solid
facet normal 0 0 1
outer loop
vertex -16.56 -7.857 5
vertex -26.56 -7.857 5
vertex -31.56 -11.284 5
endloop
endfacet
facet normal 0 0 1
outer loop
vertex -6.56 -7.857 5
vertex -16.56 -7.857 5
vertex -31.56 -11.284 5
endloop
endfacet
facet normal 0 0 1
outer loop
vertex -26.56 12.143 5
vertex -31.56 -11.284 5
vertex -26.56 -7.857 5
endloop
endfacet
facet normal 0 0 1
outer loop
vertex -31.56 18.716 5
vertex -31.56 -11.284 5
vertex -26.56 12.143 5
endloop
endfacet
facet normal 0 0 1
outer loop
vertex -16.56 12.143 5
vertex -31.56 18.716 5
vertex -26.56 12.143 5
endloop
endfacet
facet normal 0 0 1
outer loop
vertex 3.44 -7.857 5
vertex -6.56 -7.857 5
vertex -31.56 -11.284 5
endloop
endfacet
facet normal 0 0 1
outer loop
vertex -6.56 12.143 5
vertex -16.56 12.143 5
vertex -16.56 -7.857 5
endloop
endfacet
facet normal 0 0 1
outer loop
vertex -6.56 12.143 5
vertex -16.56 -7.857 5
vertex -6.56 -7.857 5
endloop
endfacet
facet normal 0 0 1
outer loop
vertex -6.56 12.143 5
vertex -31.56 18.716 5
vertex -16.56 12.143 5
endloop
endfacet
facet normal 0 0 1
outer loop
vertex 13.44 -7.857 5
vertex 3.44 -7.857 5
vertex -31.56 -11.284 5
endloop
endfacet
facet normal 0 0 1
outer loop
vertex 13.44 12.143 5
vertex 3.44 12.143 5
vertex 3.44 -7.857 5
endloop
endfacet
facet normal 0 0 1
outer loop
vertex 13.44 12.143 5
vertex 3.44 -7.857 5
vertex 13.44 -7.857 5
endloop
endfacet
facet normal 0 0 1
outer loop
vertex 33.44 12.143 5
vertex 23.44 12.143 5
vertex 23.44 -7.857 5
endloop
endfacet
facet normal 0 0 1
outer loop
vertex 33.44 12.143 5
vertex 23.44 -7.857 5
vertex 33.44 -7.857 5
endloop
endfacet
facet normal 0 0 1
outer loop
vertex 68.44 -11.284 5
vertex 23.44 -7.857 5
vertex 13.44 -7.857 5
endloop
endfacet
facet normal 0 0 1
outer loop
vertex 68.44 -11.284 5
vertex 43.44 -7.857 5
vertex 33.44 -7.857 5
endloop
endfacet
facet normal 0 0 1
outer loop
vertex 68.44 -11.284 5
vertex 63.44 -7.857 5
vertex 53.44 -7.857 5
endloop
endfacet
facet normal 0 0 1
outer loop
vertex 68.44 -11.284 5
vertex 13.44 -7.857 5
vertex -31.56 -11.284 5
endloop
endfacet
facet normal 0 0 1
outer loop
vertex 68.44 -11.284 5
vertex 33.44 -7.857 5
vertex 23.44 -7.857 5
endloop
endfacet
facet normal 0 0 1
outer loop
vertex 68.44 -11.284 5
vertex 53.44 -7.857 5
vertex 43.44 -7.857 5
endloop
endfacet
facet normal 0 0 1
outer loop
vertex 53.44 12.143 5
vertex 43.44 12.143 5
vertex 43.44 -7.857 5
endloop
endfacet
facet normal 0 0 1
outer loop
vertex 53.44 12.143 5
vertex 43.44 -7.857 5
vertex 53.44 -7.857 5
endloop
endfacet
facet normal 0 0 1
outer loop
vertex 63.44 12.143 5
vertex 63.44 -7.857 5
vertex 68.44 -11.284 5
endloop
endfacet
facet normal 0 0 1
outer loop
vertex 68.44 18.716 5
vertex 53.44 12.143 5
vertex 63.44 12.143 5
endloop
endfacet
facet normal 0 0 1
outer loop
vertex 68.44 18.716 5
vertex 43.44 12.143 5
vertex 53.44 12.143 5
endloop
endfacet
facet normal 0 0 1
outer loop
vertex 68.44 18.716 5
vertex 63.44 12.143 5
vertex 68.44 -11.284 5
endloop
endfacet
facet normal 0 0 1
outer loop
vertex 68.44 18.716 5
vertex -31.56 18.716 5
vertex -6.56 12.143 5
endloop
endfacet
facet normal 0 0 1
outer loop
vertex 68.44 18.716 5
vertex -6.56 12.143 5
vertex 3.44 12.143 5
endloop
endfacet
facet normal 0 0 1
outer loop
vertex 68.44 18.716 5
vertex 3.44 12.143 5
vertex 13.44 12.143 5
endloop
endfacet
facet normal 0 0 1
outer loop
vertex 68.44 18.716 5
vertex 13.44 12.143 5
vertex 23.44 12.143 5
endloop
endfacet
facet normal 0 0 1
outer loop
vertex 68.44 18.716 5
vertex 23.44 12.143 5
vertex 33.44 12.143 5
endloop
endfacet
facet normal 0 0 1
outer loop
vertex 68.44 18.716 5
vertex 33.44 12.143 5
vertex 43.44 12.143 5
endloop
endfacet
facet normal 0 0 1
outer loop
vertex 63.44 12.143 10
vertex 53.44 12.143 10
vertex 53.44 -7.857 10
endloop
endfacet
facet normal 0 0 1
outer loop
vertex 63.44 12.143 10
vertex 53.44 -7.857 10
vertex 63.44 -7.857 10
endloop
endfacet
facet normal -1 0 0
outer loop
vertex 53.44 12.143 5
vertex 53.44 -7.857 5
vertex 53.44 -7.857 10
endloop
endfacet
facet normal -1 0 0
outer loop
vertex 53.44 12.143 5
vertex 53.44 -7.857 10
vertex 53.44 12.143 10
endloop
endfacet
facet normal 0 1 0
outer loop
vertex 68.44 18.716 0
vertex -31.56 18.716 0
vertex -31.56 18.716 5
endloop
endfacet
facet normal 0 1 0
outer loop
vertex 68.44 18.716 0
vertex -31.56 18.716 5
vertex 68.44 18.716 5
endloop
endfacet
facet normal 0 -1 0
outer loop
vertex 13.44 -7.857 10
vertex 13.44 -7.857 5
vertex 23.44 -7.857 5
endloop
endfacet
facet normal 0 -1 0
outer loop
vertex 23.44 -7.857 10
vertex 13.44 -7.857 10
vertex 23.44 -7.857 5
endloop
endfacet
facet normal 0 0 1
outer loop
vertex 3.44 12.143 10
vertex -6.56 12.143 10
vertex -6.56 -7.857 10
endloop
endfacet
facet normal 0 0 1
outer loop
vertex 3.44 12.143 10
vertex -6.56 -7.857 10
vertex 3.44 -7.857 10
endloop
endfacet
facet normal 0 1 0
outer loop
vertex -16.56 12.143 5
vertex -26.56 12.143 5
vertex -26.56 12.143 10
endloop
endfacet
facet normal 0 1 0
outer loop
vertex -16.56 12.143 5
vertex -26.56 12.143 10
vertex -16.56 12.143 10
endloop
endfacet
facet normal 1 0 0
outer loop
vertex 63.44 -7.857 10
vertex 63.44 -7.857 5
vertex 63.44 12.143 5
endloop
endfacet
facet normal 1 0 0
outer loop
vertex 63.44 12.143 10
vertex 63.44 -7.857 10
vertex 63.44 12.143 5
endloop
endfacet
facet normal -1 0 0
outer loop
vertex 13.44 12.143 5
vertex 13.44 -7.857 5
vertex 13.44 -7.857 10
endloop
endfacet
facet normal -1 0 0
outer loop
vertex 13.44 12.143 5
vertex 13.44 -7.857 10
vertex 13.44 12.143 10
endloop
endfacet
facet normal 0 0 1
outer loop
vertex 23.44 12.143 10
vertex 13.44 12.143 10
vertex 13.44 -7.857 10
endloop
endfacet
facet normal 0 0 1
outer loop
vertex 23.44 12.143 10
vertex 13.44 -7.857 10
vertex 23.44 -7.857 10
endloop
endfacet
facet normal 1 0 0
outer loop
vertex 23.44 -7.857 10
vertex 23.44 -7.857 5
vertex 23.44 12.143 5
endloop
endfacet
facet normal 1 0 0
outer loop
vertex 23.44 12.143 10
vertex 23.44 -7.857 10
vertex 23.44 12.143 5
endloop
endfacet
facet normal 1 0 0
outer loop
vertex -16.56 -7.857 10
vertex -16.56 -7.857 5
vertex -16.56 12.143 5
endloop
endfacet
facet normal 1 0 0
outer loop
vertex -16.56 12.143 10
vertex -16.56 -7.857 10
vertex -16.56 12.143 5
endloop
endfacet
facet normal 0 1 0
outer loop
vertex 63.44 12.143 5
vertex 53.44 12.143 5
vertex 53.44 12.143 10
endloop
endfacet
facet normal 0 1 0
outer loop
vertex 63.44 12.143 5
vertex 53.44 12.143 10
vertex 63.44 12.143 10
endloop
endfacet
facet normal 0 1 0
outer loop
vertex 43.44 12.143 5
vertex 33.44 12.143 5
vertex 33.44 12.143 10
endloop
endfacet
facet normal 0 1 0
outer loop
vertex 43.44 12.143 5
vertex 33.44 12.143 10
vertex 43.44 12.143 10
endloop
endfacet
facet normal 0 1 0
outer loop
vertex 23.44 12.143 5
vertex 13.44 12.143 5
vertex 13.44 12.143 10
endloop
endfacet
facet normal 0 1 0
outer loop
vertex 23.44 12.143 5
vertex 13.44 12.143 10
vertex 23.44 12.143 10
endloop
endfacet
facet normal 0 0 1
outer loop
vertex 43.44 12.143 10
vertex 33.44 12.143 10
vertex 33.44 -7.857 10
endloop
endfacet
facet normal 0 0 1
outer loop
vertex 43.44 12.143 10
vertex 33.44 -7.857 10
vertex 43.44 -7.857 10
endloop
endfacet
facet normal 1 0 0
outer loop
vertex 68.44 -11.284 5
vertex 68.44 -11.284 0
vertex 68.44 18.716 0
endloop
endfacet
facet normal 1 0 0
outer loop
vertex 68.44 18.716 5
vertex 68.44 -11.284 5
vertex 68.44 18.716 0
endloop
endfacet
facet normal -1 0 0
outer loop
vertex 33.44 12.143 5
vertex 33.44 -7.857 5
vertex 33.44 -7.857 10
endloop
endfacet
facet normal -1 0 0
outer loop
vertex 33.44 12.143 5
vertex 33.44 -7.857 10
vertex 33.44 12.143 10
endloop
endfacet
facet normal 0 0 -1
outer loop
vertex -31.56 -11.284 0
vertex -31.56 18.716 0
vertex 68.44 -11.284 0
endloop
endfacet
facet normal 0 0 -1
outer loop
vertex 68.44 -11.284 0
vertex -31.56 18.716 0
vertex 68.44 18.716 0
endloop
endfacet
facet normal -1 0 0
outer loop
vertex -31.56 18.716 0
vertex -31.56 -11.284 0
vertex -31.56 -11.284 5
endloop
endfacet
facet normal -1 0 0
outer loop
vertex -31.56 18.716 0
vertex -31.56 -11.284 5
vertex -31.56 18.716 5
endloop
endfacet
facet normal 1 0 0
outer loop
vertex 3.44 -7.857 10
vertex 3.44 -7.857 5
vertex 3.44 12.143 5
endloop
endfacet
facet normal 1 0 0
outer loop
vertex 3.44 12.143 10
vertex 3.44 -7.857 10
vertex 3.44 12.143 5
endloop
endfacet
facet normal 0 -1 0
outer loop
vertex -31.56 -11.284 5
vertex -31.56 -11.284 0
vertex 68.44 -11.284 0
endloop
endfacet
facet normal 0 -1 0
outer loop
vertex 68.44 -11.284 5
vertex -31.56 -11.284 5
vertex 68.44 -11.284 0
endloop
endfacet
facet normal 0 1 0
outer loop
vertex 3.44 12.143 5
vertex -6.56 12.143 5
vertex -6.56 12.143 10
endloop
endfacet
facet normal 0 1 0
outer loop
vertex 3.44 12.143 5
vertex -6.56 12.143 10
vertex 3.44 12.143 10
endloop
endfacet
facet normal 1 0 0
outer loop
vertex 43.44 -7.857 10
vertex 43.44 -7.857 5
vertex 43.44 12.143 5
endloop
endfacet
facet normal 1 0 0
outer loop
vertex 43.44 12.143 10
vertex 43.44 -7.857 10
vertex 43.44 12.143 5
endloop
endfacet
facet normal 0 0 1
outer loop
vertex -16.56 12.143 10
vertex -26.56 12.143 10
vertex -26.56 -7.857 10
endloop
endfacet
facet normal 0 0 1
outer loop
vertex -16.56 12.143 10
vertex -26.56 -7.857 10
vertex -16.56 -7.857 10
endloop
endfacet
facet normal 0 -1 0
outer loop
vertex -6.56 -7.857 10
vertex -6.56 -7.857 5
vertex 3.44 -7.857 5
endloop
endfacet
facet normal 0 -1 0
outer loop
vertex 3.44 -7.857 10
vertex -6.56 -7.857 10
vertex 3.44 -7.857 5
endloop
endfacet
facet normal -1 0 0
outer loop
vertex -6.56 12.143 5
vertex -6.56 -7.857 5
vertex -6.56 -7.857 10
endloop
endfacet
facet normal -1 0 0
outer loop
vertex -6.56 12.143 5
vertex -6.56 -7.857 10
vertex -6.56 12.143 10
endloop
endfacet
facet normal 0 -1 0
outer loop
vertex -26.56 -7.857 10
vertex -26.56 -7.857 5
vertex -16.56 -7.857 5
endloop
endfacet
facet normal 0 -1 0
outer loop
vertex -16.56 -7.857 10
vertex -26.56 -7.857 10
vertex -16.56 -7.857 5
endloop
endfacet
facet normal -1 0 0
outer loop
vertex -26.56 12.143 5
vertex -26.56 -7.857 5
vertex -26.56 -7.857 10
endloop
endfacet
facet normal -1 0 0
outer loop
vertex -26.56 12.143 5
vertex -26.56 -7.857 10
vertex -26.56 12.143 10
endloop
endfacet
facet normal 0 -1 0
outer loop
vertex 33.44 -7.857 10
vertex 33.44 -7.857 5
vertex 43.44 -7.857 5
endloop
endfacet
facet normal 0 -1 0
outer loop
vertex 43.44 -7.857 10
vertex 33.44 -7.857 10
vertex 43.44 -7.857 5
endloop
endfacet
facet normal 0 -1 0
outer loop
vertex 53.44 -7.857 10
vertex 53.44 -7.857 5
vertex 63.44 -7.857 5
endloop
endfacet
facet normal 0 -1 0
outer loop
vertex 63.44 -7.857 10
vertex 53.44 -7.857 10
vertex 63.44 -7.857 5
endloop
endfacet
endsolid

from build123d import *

# Parameters (mm, degrees)
SKETCH1_W           = 100
SKETCH1_H           = 30
BOSS_EXTRUDE1_DEPTH = 5
SKETCH2_W           = 10
SKETCH2_H           = 20
BOSS_EXTRUDE2_DEPTH = 5
LPATTERN1_COUNT     = 5
LPATTERN1_PITCH     = 20


with BuildPart() as part:
    # Sketch1 → Boss-Extrude1 (new body)
    with BuildSketch(Plane.XY):
        with Locations((18.440366972, 3.71559633)):
            Rectangle(SKETCH1_W, SKETCH1_H)
    extrude(amount=BOSS_EXTRUDE1_DEPTH)

    # Sketch2 → Boss-Extrude2 (add)
    with BuildSketch(Plane.XY.offset(5)):
        with Locations((-21.559633028, 2.143304858)):
            Rectangle(SKETCH2_W, SKETCH2_H)
    boss_extrude2 = extrude(amount=BOSS_EXTRUDE2_DEPTH)

    # LPattern1: Boss-Extrude2 ×5
    with Locations(*[(i * LPATTERN1_PITCH, 0, 0) for i in range(1, LPATTERN1_COUNT)]):
        add(boss_extrude2)


solid = part.part
